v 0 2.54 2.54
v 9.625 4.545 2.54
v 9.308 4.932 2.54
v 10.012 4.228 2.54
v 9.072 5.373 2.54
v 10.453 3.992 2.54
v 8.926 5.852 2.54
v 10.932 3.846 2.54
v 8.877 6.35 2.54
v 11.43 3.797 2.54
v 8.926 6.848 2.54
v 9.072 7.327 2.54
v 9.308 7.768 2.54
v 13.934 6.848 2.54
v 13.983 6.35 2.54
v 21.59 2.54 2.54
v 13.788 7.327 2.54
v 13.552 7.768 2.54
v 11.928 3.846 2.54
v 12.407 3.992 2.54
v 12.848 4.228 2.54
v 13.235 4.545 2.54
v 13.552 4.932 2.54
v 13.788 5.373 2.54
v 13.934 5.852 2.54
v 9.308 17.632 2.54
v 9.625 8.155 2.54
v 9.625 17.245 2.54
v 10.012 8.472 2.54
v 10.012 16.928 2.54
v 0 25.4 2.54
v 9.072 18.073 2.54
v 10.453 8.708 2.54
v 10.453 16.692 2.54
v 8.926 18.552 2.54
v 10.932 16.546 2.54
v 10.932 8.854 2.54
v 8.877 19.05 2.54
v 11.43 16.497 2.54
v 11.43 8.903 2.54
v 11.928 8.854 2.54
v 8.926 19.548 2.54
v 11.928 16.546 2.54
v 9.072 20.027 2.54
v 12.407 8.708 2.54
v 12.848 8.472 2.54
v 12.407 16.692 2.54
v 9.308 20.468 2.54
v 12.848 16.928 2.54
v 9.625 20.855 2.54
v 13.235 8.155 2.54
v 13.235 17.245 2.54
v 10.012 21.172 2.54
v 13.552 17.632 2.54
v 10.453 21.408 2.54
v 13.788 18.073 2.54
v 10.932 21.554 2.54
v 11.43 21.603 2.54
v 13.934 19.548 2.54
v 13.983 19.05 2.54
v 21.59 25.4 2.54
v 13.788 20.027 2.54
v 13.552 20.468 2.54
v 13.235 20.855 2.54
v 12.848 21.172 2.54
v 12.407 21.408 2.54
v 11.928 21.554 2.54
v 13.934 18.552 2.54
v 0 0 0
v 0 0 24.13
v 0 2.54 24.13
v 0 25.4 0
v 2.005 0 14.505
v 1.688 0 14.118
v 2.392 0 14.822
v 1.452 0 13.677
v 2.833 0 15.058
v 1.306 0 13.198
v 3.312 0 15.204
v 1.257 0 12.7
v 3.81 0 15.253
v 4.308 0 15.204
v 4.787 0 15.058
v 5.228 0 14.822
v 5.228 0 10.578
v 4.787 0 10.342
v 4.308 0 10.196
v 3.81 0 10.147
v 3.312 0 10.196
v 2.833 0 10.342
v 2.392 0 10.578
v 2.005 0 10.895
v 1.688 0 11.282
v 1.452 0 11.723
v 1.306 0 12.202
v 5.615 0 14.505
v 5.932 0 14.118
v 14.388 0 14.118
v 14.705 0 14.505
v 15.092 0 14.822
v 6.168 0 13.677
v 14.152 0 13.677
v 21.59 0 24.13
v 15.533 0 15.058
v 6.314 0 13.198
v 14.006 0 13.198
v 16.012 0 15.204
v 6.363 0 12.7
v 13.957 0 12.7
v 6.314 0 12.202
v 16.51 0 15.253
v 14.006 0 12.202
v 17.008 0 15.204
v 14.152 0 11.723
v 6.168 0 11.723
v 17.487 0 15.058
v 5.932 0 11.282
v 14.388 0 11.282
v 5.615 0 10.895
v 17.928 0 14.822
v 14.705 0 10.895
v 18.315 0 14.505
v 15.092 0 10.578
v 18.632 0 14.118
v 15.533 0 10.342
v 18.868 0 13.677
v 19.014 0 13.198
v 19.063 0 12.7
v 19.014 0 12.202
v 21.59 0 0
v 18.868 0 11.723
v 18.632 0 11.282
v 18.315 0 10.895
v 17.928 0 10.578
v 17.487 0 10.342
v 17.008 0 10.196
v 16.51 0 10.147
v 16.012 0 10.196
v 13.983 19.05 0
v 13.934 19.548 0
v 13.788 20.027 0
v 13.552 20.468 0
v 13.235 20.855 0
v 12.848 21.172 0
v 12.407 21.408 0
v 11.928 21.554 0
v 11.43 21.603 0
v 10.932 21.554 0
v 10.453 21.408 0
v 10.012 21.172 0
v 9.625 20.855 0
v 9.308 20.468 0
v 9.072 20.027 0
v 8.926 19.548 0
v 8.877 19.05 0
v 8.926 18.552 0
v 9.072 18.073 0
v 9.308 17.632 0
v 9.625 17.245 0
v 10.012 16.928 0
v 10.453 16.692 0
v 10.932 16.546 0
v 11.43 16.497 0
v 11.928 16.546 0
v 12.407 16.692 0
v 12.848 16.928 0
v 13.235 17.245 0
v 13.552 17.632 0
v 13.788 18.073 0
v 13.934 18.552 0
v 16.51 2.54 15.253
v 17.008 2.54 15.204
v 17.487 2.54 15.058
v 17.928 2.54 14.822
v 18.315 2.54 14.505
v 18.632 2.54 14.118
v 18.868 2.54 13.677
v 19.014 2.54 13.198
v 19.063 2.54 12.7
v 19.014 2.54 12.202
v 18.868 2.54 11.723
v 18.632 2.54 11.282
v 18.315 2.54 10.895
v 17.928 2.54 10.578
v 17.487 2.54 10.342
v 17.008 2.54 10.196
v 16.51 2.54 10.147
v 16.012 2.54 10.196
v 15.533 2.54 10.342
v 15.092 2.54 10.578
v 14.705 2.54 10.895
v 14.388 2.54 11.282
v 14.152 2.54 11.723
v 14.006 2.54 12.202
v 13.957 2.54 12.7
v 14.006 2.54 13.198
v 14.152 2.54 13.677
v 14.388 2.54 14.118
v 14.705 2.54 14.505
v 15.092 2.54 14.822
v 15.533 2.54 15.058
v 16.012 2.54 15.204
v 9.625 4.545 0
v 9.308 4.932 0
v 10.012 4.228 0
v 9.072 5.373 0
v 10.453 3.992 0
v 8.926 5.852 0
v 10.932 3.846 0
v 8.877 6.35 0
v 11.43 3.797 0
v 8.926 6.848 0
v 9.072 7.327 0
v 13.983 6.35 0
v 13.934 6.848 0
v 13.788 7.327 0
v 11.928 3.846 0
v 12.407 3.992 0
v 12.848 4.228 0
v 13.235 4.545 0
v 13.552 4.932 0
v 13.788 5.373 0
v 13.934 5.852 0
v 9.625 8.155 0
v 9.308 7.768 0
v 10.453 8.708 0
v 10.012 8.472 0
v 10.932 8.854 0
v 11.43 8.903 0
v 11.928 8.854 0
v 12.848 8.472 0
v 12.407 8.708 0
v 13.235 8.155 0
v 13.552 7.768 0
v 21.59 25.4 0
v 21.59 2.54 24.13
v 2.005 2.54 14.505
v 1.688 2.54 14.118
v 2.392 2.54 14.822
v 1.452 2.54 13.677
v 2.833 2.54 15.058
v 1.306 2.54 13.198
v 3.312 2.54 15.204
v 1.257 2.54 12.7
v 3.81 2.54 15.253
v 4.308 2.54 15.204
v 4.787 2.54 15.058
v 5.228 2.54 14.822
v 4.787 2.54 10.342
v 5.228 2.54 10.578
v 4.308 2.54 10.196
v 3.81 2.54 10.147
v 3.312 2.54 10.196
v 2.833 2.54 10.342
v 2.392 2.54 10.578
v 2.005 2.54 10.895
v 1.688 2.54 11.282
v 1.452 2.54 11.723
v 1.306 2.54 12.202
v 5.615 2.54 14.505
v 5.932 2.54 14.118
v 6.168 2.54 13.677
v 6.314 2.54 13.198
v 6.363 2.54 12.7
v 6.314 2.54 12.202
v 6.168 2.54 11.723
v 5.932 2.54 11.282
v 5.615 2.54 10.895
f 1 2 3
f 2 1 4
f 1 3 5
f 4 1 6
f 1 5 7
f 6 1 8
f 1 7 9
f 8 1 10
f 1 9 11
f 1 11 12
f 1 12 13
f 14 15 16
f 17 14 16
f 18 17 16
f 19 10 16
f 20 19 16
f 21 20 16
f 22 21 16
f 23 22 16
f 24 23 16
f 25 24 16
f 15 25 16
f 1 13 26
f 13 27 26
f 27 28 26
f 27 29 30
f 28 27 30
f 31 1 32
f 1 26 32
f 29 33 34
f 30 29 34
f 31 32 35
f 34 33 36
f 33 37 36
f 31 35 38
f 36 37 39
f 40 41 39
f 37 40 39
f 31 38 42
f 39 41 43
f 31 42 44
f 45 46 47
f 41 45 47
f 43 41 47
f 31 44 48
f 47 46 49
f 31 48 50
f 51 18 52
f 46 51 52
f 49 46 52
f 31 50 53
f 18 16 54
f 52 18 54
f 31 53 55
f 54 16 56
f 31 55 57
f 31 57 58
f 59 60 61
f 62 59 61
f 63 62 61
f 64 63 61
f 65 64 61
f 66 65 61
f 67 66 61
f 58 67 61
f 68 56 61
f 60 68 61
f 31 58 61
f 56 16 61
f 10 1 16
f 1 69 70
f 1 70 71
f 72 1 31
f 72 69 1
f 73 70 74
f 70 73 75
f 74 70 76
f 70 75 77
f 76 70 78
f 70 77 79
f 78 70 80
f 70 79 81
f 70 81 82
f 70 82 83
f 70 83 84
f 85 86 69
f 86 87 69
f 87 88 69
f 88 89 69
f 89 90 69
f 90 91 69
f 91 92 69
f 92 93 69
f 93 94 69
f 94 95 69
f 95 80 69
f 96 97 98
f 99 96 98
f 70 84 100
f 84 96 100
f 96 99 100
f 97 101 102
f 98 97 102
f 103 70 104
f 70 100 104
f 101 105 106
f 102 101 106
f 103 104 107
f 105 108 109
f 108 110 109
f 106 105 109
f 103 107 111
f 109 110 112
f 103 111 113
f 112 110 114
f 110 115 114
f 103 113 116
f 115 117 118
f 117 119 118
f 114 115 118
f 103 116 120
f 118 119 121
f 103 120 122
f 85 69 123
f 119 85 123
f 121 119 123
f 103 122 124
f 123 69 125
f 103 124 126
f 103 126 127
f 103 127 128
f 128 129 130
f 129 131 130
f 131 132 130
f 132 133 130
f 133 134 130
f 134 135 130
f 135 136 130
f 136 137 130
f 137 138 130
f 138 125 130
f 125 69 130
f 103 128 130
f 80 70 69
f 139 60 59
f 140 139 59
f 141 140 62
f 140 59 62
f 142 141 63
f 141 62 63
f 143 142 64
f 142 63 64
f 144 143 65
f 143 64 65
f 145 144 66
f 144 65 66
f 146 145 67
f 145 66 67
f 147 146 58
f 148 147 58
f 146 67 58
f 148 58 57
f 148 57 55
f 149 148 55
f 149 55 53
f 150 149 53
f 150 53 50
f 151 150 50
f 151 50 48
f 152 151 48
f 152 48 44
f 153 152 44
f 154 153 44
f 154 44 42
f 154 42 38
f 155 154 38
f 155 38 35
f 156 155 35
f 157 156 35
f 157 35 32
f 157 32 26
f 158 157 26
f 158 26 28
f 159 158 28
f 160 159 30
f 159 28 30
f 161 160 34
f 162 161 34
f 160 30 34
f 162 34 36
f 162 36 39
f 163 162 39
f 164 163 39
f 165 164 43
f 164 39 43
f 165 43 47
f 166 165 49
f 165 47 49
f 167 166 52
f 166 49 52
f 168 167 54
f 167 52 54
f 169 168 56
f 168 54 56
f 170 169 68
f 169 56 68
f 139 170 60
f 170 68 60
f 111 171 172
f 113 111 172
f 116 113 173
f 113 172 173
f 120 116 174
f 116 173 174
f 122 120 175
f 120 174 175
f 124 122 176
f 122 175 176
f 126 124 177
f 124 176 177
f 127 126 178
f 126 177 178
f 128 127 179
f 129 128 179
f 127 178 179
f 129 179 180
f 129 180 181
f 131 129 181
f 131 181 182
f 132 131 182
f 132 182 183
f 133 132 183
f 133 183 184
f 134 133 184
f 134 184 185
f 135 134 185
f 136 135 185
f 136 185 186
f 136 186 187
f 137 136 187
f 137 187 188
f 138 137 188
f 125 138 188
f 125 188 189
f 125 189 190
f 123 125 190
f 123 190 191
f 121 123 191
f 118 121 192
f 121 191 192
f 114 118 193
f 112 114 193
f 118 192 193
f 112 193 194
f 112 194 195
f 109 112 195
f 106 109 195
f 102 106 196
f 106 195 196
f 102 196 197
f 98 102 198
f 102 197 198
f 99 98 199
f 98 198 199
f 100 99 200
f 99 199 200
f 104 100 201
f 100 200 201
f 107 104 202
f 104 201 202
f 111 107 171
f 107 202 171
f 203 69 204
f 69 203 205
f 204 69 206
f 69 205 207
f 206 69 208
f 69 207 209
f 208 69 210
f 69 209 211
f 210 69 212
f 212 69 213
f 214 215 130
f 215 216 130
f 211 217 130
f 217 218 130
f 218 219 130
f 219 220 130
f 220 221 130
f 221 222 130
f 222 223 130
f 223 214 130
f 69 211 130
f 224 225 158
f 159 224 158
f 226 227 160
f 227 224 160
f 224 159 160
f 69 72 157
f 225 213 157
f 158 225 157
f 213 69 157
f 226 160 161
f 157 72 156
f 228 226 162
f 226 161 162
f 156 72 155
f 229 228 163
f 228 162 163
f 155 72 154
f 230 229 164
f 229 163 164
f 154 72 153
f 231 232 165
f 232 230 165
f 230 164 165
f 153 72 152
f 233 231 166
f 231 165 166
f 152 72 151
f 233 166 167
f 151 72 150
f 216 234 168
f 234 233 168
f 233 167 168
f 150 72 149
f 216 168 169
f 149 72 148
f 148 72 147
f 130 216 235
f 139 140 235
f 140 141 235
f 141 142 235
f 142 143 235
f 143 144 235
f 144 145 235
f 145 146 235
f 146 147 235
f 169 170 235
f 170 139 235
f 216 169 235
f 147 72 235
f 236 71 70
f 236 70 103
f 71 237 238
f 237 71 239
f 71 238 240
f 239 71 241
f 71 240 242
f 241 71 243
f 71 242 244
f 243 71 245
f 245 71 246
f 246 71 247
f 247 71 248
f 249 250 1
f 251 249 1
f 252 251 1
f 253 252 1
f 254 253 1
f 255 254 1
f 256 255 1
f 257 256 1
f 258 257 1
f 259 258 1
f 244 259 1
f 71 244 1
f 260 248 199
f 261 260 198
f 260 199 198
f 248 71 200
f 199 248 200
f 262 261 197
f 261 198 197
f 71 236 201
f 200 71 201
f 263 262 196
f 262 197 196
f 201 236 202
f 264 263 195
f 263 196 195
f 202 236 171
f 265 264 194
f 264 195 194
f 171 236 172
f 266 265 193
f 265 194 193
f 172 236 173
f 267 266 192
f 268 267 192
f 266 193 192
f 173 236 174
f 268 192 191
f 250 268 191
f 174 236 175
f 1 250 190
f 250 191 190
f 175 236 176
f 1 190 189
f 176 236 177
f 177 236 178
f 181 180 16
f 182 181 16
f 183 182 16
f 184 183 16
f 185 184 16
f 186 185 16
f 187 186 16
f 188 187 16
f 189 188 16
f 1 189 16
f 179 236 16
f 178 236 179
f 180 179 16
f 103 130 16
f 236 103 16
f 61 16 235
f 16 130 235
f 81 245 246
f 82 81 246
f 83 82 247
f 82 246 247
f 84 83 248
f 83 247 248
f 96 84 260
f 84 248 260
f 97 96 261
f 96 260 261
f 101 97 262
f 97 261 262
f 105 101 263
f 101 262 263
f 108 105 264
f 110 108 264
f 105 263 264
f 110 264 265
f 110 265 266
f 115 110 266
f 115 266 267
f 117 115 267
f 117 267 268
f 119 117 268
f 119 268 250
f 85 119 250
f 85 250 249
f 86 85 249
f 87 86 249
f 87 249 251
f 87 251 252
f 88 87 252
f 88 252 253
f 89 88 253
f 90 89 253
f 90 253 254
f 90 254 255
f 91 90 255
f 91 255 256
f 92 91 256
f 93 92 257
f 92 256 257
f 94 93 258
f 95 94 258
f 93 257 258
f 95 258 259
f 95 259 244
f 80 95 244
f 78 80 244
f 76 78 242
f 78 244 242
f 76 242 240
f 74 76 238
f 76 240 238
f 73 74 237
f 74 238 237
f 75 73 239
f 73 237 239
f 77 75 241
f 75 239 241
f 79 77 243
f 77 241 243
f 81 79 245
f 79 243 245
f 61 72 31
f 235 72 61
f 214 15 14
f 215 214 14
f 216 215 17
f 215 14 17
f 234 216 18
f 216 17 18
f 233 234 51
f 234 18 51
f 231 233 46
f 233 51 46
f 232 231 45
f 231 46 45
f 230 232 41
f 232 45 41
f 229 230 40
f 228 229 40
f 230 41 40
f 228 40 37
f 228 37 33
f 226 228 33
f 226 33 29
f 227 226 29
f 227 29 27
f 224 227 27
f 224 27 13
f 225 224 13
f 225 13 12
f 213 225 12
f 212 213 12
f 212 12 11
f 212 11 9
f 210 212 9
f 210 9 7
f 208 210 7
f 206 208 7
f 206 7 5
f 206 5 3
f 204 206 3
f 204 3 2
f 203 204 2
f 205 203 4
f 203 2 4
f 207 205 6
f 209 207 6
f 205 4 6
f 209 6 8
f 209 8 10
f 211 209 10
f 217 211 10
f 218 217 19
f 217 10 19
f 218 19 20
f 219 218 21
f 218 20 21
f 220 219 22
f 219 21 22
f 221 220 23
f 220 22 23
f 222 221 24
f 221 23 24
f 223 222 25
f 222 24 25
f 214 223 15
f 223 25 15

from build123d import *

# Parameters (mm, degrees)
SKETCH1_W           = 21.59
SKETCH1_H           = 25.4
BOSS_EXTRUDE1_DEPTH = 24.13
SKETCH2_W           = 21.59
SKETCH2_H           = 22.86
CUT_EXTRUDE1_DEPTH  = 42.152703435
SKETCH3_R           = 2.5527
CUT_EXTRUDE2_DEPTH  = 40.716699259
SKETCH4_R           = 2.5527
CUT_EXTRUDE3_DEPTH  = 40.635395797


with BuildPart() as part:
    # Sketch1 → Boss-Extrude1 (new body)
    with BuildSketch(Plane.XY):
        with Locations((10.795, 12.7)):
            Rectangle(SKETCH1_W, SKETCH1_H)
    extrude(amount=BOSS_EXTRUDE1_DEPTH)

    # Sketch2 → Cut-Extrude1 (cut, through all)
    with BuildSketch(Plane(origin=(21.59, 0, 0), x_dir=(0, 0, -1), z_dir=(1, 0, 0))):
        with Locations((-13.335, 13.97)):
            Rectangle(SKETCH2_W, SKETCH2_H)
    extrude(amount=-CUT_EXTRUDE1_DEPTH, mode=Mode.SUBTRACT)

    # Sketch3 → Cut-Extrude2 (cut, through all)
    with BuildSketch(Plane.XY.offset(2.54)):
        with Locations((11.43, 19.05)):
            Circle(SKETCH3_R)
        with Locations((11.43, 6.35)):
            Circle(SKETCH3_R)
    extrude(amount=-CUT_EXTRUDE2_DEPTH, mode=Mode.SUBTRACT)

    # Sketch4 → Cut-Extrude3 (cut, through all)
    with BuildSketch(Plane(origin=(0, 2.54, 0), x_dir=(1, 0, 0), z_dir=(0, 1, 0))):
        with Locations(Location((16.51, -12.7, 0), (0, 0, 270))):
            Circle(SKETCH4_R)
        with Locations(Location((3.81, -12.7, 0), (0, 0, 270))):
            Circle(SKETCH4_R)
    extrude(amount=-CUT_EXTRUDE3_DEPTH, mode=Mode.SUBTRACT)


solid = part.part
